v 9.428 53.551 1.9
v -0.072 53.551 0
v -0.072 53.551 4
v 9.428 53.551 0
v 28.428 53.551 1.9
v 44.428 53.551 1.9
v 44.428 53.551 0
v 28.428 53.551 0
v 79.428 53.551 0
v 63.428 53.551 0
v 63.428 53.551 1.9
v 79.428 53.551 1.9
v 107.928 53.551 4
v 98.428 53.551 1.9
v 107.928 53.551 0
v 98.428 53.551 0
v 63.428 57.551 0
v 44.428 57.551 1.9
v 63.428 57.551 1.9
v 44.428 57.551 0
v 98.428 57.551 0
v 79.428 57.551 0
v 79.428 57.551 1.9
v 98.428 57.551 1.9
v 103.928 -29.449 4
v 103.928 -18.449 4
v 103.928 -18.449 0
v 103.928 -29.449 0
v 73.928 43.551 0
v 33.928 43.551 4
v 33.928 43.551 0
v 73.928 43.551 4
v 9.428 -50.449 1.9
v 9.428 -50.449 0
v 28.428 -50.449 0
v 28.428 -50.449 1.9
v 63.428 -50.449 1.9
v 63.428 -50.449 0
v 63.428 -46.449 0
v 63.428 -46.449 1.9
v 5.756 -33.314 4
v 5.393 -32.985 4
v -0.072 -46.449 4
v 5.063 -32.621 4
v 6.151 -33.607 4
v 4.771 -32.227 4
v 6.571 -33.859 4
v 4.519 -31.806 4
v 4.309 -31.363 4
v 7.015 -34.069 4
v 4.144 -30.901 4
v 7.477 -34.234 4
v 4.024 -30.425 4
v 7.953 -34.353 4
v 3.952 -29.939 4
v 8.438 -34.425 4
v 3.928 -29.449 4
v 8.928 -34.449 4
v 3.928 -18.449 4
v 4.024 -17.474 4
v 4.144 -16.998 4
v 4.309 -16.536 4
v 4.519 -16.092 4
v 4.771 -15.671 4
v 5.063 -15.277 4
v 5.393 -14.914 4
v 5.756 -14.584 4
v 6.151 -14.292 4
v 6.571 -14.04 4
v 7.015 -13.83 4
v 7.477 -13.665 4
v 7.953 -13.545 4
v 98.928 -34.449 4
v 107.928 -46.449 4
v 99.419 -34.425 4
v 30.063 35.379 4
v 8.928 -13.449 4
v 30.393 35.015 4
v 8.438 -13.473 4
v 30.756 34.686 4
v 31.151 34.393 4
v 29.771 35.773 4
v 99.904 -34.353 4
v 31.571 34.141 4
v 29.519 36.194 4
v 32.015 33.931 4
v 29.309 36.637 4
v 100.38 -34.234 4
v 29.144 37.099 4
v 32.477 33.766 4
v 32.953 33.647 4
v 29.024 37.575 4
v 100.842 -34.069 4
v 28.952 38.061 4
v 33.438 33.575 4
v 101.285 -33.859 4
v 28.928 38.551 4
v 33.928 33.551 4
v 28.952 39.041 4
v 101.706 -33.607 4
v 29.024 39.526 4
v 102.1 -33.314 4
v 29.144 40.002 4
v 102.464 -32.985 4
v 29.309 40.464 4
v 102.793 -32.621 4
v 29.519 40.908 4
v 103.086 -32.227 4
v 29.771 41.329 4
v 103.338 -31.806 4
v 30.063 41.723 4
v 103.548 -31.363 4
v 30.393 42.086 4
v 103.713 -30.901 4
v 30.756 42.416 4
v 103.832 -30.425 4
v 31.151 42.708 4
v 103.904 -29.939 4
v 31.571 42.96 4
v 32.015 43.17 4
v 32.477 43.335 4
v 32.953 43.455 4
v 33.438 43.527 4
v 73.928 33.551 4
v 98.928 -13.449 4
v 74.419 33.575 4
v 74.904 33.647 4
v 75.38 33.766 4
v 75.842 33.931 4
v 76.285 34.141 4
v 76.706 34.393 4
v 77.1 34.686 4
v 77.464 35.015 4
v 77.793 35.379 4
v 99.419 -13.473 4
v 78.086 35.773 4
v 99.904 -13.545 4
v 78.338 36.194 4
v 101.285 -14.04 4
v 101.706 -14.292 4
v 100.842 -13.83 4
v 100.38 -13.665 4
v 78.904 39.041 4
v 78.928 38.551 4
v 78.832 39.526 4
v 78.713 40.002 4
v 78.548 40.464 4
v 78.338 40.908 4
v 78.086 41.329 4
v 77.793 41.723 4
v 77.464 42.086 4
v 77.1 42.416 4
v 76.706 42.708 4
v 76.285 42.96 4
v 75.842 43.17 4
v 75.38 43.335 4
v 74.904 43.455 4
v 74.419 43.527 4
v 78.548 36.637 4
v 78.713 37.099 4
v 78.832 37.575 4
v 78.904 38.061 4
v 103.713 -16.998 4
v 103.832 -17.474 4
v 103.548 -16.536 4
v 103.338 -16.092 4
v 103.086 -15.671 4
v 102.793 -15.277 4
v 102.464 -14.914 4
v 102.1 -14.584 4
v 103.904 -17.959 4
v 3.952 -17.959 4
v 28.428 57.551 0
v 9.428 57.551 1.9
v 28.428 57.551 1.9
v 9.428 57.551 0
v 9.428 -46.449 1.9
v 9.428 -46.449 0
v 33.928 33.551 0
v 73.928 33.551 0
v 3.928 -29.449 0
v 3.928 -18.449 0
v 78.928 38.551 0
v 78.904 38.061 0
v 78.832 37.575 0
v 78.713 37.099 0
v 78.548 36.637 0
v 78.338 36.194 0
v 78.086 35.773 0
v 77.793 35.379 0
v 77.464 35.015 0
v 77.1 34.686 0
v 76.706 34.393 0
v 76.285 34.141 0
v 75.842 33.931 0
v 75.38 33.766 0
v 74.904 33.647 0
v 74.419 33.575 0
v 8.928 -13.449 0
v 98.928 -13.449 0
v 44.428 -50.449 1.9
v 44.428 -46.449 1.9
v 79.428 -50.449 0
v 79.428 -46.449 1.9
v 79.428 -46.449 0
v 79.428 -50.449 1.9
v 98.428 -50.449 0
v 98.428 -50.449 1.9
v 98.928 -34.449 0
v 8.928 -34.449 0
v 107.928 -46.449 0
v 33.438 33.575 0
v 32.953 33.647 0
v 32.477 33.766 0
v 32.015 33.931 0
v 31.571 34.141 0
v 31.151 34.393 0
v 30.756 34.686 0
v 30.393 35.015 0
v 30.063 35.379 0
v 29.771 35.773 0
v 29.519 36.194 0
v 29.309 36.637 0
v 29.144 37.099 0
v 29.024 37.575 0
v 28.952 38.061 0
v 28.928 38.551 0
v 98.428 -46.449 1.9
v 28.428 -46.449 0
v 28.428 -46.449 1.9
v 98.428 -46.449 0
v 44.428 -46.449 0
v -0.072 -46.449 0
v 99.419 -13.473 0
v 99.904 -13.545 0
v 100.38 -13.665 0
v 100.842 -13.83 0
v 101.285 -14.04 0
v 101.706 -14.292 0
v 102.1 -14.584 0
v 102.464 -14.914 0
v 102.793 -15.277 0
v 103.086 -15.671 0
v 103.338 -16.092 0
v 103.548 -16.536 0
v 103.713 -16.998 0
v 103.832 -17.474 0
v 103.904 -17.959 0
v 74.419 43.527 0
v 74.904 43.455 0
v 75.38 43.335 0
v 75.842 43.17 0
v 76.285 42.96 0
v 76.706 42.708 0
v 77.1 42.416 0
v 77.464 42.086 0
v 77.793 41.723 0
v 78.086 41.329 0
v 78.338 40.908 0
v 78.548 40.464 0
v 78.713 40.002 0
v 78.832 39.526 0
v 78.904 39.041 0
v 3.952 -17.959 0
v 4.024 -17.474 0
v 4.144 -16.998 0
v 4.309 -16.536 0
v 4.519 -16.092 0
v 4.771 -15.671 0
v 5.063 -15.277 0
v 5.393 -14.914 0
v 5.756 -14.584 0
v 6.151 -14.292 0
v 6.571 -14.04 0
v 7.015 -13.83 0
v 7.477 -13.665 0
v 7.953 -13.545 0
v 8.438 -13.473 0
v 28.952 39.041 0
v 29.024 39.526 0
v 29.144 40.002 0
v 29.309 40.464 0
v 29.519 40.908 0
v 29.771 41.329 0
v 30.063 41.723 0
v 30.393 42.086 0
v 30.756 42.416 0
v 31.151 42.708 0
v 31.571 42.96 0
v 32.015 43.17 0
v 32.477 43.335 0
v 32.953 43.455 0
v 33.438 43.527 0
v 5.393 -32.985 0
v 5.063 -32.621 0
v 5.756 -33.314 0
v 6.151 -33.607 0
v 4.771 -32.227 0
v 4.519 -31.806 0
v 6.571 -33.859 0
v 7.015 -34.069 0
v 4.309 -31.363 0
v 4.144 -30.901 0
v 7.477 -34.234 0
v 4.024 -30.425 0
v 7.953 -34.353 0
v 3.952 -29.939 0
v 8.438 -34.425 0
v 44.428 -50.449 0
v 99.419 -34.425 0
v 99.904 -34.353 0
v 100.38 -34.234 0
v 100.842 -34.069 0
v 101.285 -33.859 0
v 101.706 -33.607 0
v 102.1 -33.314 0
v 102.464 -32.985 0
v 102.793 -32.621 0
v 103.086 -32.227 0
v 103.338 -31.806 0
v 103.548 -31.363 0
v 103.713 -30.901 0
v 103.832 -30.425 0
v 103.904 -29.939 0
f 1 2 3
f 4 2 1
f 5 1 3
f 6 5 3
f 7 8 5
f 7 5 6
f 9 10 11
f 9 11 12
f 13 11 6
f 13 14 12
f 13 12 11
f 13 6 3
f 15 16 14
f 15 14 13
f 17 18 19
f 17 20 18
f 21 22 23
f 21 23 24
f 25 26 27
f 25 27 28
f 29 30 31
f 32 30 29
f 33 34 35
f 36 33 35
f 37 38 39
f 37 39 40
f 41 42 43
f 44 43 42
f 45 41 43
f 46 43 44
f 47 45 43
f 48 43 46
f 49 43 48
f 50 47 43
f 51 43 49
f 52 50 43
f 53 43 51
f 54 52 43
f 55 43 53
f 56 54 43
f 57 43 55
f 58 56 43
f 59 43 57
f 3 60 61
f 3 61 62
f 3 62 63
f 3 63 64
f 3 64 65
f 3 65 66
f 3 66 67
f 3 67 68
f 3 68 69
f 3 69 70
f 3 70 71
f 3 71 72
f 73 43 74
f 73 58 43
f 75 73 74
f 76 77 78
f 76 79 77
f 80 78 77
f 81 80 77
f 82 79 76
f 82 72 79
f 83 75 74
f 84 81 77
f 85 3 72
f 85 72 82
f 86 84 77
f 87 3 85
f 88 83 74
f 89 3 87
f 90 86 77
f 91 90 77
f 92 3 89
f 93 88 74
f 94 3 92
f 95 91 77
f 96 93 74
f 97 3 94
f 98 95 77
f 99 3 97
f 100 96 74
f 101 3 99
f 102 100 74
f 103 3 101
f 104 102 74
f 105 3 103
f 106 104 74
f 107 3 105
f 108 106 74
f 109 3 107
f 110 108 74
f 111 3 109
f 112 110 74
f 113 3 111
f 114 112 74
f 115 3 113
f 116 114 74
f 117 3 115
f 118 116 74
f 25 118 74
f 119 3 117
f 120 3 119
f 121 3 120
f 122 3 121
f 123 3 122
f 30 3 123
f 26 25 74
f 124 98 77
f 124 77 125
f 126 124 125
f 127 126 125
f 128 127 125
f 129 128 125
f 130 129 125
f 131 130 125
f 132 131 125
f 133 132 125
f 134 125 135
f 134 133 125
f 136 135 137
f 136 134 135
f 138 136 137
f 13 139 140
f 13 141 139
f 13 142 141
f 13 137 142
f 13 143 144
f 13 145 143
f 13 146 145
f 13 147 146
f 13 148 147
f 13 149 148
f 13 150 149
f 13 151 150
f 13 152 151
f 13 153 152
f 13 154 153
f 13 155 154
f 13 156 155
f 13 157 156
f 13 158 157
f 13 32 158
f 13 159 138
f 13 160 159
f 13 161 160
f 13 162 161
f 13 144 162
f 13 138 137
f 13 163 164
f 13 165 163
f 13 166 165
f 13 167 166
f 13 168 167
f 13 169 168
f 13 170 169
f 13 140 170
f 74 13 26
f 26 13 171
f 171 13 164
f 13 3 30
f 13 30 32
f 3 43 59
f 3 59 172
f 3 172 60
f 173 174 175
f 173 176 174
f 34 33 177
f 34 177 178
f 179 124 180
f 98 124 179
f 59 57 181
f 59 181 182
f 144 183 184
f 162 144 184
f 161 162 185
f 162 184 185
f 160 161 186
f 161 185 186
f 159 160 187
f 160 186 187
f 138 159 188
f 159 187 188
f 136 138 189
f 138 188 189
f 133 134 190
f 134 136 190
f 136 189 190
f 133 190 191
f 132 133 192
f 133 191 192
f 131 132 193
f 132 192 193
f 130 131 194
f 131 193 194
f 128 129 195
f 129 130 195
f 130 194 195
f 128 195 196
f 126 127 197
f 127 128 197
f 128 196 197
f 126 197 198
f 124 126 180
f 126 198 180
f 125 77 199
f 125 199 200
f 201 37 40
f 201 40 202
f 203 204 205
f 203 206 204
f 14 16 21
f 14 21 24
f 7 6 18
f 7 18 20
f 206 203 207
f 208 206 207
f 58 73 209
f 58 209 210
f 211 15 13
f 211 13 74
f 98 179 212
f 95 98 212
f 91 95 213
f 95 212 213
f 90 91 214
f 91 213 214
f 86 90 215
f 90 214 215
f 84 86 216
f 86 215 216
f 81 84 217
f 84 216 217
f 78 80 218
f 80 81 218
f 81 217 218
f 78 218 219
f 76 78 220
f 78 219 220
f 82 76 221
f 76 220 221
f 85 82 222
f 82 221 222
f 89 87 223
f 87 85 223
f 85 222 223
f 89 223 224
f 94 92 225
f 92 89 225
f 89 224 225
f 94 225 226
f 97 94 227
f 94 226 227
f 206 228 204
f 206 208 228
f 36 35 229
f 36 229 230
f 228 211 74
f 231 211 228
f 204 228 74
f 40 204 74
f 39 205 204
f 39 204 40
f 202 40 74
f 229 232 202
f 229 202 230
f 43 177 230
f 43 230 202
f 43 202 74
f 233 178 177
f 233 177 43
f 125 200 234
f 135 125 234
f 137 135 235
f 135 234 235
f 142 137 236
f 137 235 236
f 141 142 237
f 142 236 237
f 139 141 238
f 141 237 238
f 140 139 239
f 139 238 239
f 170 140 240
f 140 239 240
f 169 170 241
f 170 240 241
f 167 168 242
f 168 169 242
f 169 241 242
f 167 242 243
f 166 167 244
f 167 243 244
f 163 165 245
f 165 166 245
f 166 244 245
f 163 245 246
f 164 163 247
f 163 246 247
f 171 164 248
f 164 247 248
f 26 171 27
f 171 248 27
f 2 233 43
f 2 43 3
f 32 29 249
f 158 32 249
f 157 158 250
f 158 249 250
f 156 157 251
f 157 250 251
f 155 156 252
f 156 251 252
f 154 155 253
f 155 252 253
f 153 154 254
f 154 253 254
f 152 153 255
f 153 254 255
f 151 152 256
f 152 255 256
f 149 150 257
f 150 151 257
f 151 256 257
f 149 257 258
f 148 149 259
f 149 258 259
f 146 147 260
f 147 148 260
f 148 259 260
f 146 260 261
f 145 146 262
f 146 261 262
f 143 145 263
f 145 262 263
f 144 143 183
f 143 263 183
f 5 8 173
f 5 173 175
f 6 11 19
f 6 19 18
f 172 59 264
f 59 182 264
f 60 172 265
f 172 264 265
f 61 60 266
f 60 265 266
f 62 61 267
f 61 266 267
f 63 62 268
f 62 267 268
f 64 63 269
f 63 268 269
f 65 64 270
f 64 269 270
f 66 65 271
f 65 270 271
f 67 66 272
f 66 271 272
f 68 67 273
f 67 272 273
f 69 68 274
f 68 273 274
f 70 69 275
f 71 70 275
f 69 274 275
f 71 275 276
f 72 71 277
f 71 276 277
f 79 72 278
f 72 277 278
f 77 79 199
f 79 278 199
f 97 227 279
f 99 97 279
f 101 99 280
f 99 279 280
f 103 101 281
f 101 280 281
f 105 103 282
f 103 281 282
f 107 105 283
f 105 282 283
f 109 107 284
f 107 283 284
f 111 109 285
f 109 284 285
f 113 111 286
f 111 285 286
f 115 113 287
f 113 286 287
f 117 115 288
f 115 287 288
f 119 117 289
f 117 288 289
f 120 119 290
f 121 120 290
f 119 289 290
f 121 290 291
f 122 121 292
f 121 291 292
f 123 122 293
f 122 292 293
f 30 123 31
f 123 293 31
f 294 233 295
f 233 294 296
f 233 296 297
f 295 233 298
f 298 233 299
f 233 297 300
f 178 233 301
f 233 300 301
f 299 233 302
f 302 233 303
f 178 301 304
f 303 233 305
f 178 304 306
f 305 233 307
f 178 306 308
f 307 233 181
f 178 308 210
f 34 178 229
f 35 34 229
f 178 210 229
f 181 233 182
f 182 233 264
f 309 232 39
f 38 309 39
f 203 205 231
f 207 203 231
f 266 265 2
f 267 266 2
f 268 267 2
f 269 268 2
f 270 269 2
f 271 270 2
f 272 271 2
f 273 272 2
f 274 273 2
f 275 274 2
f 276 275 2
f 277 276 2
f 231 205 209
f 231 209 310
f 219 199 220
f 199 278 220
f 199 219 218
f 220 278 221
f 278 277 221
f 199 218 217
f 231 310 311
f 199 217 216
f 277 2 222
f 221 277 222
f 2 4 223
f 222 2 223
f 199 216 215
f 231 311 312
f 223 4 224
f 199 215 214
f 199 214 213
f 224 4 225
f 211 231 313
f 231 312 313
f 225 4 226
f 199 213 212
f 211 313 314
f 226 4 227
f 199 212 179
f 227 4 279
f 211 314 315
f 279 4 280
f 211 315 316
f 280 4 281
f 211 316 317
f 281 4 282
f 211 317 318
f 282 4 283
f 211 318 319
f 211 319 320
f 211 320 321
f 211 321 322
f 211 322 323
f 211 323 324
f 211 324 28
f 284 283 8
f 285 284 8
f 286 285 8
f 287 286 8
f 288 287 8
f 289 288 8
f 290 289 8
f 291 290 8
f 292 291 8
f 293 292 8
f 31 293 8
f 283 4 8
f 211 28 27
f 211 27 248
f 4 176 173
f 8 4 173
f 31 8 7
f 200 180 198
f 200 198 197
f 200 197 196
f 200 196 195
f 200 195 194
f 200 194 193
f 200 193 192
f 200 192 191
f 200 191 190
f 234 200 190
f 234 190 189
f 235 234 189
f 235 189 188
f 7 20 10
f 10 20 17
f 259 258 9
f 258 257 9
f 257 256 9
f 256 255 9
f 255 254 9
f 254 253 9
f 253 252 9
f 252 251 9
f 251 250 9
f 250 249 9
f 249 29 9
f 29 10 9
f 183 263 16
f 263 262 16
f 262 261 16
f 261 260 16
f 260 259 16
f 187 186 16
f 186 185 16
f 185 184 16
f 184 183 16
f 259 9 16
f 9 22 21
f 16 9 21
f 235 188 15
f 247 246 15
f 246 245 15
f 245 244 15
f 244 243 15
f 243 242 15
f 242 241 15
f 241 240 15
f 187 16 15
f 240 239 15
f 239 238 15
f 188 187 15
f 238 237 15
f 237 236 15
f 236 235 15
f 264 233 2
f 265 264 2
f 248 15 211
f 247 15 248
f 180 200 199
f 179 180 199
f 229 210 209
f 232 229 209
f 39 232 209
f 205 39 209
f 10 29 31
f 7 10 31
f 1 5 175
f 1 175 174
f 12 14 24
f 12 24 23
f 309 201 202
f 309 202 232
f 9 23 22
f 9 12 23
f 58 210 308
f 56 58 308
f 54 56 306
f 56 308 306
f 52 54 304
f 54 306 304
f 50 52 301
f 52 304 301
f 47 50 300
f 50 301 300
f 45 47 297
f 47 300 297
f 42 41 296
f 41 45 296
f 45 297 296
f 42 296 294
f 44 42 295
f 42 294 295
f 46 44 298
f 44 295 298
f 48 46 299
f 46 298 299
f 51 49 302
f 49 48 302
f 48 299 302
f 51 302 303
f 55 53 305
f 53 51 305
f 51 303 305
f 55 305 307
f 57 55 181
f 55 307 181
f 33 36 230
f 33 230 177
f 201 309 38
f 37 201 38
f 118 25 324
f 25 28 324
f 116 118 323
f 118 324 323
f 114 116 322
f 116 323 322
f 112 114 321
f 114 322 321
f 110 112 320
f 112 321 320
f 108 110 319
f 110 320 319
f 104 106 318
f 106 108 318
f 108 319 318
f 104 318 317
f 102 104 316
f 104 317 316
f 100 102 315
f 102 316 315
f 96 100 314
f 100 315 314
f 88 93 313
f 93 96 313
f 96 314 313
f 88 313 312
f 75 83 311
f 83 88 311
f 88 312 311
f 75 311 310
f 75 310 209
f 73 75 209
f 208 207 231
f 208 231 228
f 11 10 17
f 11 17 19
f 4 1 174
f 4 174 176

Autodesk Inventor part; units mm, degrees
ref_plane "YZ Plane" through (0, 0, 0) normal (1, 0, 0) x (0, 1, 0)
ref_plane "XZ Plane" through (0, 0, 0) normal (0, 1, 0) x (-1, 0, 0)
ref_plane "XY Plane" through (0, 0, 0) normal (0, 0, 1) x (1, 0, 0)
sketch "Sketch1" plane through (0, 0, 0) normal (0, 0, 1) x (1, 0, 0)
  line L0 (-0.0716, 53.5507) -> (107.9284, 53.5507)
  line L1 (107.9284, 53.5507) -> (107.9284, -46.4493)
  line L2 (107.9284, -46.4493) -> (-0.0716, -46.4493)
  line L3 (-0.0716, -46.4493) -> (-0.0716, 53.5507)
  point P0 (0, 0)
  dimension "d0" = 108
  dimension "d1" = 100
extrude "Extrusion1" add sketch "Sketch1" along normal blind 4
sketch "Sketch2" plane through (-0.0716, 53.5507, 0) normal (0, 1, 0) x (1, 0, 0)
  line L0 (0, 0) -> (108, 0) projected
  line L1 (9.5, 0) -> (28.5, 0)
  line L2 (28.5, 0) -> (28.5, -1.9)
  line L3 (28.5, -1.9) -> (9.5, -1.9)
  line L4 (9.5, -1.9) -> (9.5, 0)
  point P0 (0.0716, 0)
  point P1 (28.5, 0)
  dimension "d4" = 19
  dimension "d5" = 1.9
  dimension "d6" = 9.5
extrude "Extrusion2" add sketch "Sketch2" along normal blind 4
pattern_linear "Rectangular Pattern1" count 3 spacing 35 along (1, 0, 0) count 2 spacing 104 along (0, -1, 0) of "Extrusion2"
sketch "Sketch3" plane through (0, 0, 4) normal (0, 0, 1) x (1, 0, 0)
  line L0 (3.9284, -13.4493) -> (103.9284, -13.4493)
  line L1 (103.9284, -13.4493) -> (103.9284, -34.4493)
  line L2 (103.9284, -34.4493) -> (3.9284, -34.4493)
  line L3 (3.9284, -34.4493) -> (3.9284, -13.4493)
  line L4 (-0.0716, 53.5507) -> (-0.0716, -46.4493) projected
  line L5 (107.9284, 53.5507) -> (-0.0716, 53.5507) projected
  line L6 (28.9284, 43.5507) -> (78.9284, 43.5507)
  line L7 (78.9284, 43.5507) -> (78.9284, 33.5507)
  line L8 (78.9284, 33.5507) -> (28.9284, 33.5507)
  line L9 (28.9284, 33.5507) -> (28.9284, 43.5507)
  point P0 (0, 0)
  point P1 (53.9284, -13.4493)
  point P2 (53.9284, 33.5507)
  dimension "d15" = 100
  dimension "d16" = 21
  dimension "d17" = 4
  dimension "d18" = 67
  dimension "d21" = 50
  dimension "d22" = 10
  dimension "d23" = 0
  dimension "d24" = 10
extrude "Extrusion3" cut sketch "Sketch3" against normal blind 4
fillet "Fillet1" radius 5 8 edges at (3.9284, -34.4493, 2) (3.9284, -13.4493, 2) (103.9284, -13.4493, 2) (103.9284, -34.4493, 2) (78.9284, 33.5507, 2) (28.9284, 33.5507, 2) (28.9284, 43.5507, 2) (78.9284, 43.5507, 2)
properties part number "Enclosure_5"
